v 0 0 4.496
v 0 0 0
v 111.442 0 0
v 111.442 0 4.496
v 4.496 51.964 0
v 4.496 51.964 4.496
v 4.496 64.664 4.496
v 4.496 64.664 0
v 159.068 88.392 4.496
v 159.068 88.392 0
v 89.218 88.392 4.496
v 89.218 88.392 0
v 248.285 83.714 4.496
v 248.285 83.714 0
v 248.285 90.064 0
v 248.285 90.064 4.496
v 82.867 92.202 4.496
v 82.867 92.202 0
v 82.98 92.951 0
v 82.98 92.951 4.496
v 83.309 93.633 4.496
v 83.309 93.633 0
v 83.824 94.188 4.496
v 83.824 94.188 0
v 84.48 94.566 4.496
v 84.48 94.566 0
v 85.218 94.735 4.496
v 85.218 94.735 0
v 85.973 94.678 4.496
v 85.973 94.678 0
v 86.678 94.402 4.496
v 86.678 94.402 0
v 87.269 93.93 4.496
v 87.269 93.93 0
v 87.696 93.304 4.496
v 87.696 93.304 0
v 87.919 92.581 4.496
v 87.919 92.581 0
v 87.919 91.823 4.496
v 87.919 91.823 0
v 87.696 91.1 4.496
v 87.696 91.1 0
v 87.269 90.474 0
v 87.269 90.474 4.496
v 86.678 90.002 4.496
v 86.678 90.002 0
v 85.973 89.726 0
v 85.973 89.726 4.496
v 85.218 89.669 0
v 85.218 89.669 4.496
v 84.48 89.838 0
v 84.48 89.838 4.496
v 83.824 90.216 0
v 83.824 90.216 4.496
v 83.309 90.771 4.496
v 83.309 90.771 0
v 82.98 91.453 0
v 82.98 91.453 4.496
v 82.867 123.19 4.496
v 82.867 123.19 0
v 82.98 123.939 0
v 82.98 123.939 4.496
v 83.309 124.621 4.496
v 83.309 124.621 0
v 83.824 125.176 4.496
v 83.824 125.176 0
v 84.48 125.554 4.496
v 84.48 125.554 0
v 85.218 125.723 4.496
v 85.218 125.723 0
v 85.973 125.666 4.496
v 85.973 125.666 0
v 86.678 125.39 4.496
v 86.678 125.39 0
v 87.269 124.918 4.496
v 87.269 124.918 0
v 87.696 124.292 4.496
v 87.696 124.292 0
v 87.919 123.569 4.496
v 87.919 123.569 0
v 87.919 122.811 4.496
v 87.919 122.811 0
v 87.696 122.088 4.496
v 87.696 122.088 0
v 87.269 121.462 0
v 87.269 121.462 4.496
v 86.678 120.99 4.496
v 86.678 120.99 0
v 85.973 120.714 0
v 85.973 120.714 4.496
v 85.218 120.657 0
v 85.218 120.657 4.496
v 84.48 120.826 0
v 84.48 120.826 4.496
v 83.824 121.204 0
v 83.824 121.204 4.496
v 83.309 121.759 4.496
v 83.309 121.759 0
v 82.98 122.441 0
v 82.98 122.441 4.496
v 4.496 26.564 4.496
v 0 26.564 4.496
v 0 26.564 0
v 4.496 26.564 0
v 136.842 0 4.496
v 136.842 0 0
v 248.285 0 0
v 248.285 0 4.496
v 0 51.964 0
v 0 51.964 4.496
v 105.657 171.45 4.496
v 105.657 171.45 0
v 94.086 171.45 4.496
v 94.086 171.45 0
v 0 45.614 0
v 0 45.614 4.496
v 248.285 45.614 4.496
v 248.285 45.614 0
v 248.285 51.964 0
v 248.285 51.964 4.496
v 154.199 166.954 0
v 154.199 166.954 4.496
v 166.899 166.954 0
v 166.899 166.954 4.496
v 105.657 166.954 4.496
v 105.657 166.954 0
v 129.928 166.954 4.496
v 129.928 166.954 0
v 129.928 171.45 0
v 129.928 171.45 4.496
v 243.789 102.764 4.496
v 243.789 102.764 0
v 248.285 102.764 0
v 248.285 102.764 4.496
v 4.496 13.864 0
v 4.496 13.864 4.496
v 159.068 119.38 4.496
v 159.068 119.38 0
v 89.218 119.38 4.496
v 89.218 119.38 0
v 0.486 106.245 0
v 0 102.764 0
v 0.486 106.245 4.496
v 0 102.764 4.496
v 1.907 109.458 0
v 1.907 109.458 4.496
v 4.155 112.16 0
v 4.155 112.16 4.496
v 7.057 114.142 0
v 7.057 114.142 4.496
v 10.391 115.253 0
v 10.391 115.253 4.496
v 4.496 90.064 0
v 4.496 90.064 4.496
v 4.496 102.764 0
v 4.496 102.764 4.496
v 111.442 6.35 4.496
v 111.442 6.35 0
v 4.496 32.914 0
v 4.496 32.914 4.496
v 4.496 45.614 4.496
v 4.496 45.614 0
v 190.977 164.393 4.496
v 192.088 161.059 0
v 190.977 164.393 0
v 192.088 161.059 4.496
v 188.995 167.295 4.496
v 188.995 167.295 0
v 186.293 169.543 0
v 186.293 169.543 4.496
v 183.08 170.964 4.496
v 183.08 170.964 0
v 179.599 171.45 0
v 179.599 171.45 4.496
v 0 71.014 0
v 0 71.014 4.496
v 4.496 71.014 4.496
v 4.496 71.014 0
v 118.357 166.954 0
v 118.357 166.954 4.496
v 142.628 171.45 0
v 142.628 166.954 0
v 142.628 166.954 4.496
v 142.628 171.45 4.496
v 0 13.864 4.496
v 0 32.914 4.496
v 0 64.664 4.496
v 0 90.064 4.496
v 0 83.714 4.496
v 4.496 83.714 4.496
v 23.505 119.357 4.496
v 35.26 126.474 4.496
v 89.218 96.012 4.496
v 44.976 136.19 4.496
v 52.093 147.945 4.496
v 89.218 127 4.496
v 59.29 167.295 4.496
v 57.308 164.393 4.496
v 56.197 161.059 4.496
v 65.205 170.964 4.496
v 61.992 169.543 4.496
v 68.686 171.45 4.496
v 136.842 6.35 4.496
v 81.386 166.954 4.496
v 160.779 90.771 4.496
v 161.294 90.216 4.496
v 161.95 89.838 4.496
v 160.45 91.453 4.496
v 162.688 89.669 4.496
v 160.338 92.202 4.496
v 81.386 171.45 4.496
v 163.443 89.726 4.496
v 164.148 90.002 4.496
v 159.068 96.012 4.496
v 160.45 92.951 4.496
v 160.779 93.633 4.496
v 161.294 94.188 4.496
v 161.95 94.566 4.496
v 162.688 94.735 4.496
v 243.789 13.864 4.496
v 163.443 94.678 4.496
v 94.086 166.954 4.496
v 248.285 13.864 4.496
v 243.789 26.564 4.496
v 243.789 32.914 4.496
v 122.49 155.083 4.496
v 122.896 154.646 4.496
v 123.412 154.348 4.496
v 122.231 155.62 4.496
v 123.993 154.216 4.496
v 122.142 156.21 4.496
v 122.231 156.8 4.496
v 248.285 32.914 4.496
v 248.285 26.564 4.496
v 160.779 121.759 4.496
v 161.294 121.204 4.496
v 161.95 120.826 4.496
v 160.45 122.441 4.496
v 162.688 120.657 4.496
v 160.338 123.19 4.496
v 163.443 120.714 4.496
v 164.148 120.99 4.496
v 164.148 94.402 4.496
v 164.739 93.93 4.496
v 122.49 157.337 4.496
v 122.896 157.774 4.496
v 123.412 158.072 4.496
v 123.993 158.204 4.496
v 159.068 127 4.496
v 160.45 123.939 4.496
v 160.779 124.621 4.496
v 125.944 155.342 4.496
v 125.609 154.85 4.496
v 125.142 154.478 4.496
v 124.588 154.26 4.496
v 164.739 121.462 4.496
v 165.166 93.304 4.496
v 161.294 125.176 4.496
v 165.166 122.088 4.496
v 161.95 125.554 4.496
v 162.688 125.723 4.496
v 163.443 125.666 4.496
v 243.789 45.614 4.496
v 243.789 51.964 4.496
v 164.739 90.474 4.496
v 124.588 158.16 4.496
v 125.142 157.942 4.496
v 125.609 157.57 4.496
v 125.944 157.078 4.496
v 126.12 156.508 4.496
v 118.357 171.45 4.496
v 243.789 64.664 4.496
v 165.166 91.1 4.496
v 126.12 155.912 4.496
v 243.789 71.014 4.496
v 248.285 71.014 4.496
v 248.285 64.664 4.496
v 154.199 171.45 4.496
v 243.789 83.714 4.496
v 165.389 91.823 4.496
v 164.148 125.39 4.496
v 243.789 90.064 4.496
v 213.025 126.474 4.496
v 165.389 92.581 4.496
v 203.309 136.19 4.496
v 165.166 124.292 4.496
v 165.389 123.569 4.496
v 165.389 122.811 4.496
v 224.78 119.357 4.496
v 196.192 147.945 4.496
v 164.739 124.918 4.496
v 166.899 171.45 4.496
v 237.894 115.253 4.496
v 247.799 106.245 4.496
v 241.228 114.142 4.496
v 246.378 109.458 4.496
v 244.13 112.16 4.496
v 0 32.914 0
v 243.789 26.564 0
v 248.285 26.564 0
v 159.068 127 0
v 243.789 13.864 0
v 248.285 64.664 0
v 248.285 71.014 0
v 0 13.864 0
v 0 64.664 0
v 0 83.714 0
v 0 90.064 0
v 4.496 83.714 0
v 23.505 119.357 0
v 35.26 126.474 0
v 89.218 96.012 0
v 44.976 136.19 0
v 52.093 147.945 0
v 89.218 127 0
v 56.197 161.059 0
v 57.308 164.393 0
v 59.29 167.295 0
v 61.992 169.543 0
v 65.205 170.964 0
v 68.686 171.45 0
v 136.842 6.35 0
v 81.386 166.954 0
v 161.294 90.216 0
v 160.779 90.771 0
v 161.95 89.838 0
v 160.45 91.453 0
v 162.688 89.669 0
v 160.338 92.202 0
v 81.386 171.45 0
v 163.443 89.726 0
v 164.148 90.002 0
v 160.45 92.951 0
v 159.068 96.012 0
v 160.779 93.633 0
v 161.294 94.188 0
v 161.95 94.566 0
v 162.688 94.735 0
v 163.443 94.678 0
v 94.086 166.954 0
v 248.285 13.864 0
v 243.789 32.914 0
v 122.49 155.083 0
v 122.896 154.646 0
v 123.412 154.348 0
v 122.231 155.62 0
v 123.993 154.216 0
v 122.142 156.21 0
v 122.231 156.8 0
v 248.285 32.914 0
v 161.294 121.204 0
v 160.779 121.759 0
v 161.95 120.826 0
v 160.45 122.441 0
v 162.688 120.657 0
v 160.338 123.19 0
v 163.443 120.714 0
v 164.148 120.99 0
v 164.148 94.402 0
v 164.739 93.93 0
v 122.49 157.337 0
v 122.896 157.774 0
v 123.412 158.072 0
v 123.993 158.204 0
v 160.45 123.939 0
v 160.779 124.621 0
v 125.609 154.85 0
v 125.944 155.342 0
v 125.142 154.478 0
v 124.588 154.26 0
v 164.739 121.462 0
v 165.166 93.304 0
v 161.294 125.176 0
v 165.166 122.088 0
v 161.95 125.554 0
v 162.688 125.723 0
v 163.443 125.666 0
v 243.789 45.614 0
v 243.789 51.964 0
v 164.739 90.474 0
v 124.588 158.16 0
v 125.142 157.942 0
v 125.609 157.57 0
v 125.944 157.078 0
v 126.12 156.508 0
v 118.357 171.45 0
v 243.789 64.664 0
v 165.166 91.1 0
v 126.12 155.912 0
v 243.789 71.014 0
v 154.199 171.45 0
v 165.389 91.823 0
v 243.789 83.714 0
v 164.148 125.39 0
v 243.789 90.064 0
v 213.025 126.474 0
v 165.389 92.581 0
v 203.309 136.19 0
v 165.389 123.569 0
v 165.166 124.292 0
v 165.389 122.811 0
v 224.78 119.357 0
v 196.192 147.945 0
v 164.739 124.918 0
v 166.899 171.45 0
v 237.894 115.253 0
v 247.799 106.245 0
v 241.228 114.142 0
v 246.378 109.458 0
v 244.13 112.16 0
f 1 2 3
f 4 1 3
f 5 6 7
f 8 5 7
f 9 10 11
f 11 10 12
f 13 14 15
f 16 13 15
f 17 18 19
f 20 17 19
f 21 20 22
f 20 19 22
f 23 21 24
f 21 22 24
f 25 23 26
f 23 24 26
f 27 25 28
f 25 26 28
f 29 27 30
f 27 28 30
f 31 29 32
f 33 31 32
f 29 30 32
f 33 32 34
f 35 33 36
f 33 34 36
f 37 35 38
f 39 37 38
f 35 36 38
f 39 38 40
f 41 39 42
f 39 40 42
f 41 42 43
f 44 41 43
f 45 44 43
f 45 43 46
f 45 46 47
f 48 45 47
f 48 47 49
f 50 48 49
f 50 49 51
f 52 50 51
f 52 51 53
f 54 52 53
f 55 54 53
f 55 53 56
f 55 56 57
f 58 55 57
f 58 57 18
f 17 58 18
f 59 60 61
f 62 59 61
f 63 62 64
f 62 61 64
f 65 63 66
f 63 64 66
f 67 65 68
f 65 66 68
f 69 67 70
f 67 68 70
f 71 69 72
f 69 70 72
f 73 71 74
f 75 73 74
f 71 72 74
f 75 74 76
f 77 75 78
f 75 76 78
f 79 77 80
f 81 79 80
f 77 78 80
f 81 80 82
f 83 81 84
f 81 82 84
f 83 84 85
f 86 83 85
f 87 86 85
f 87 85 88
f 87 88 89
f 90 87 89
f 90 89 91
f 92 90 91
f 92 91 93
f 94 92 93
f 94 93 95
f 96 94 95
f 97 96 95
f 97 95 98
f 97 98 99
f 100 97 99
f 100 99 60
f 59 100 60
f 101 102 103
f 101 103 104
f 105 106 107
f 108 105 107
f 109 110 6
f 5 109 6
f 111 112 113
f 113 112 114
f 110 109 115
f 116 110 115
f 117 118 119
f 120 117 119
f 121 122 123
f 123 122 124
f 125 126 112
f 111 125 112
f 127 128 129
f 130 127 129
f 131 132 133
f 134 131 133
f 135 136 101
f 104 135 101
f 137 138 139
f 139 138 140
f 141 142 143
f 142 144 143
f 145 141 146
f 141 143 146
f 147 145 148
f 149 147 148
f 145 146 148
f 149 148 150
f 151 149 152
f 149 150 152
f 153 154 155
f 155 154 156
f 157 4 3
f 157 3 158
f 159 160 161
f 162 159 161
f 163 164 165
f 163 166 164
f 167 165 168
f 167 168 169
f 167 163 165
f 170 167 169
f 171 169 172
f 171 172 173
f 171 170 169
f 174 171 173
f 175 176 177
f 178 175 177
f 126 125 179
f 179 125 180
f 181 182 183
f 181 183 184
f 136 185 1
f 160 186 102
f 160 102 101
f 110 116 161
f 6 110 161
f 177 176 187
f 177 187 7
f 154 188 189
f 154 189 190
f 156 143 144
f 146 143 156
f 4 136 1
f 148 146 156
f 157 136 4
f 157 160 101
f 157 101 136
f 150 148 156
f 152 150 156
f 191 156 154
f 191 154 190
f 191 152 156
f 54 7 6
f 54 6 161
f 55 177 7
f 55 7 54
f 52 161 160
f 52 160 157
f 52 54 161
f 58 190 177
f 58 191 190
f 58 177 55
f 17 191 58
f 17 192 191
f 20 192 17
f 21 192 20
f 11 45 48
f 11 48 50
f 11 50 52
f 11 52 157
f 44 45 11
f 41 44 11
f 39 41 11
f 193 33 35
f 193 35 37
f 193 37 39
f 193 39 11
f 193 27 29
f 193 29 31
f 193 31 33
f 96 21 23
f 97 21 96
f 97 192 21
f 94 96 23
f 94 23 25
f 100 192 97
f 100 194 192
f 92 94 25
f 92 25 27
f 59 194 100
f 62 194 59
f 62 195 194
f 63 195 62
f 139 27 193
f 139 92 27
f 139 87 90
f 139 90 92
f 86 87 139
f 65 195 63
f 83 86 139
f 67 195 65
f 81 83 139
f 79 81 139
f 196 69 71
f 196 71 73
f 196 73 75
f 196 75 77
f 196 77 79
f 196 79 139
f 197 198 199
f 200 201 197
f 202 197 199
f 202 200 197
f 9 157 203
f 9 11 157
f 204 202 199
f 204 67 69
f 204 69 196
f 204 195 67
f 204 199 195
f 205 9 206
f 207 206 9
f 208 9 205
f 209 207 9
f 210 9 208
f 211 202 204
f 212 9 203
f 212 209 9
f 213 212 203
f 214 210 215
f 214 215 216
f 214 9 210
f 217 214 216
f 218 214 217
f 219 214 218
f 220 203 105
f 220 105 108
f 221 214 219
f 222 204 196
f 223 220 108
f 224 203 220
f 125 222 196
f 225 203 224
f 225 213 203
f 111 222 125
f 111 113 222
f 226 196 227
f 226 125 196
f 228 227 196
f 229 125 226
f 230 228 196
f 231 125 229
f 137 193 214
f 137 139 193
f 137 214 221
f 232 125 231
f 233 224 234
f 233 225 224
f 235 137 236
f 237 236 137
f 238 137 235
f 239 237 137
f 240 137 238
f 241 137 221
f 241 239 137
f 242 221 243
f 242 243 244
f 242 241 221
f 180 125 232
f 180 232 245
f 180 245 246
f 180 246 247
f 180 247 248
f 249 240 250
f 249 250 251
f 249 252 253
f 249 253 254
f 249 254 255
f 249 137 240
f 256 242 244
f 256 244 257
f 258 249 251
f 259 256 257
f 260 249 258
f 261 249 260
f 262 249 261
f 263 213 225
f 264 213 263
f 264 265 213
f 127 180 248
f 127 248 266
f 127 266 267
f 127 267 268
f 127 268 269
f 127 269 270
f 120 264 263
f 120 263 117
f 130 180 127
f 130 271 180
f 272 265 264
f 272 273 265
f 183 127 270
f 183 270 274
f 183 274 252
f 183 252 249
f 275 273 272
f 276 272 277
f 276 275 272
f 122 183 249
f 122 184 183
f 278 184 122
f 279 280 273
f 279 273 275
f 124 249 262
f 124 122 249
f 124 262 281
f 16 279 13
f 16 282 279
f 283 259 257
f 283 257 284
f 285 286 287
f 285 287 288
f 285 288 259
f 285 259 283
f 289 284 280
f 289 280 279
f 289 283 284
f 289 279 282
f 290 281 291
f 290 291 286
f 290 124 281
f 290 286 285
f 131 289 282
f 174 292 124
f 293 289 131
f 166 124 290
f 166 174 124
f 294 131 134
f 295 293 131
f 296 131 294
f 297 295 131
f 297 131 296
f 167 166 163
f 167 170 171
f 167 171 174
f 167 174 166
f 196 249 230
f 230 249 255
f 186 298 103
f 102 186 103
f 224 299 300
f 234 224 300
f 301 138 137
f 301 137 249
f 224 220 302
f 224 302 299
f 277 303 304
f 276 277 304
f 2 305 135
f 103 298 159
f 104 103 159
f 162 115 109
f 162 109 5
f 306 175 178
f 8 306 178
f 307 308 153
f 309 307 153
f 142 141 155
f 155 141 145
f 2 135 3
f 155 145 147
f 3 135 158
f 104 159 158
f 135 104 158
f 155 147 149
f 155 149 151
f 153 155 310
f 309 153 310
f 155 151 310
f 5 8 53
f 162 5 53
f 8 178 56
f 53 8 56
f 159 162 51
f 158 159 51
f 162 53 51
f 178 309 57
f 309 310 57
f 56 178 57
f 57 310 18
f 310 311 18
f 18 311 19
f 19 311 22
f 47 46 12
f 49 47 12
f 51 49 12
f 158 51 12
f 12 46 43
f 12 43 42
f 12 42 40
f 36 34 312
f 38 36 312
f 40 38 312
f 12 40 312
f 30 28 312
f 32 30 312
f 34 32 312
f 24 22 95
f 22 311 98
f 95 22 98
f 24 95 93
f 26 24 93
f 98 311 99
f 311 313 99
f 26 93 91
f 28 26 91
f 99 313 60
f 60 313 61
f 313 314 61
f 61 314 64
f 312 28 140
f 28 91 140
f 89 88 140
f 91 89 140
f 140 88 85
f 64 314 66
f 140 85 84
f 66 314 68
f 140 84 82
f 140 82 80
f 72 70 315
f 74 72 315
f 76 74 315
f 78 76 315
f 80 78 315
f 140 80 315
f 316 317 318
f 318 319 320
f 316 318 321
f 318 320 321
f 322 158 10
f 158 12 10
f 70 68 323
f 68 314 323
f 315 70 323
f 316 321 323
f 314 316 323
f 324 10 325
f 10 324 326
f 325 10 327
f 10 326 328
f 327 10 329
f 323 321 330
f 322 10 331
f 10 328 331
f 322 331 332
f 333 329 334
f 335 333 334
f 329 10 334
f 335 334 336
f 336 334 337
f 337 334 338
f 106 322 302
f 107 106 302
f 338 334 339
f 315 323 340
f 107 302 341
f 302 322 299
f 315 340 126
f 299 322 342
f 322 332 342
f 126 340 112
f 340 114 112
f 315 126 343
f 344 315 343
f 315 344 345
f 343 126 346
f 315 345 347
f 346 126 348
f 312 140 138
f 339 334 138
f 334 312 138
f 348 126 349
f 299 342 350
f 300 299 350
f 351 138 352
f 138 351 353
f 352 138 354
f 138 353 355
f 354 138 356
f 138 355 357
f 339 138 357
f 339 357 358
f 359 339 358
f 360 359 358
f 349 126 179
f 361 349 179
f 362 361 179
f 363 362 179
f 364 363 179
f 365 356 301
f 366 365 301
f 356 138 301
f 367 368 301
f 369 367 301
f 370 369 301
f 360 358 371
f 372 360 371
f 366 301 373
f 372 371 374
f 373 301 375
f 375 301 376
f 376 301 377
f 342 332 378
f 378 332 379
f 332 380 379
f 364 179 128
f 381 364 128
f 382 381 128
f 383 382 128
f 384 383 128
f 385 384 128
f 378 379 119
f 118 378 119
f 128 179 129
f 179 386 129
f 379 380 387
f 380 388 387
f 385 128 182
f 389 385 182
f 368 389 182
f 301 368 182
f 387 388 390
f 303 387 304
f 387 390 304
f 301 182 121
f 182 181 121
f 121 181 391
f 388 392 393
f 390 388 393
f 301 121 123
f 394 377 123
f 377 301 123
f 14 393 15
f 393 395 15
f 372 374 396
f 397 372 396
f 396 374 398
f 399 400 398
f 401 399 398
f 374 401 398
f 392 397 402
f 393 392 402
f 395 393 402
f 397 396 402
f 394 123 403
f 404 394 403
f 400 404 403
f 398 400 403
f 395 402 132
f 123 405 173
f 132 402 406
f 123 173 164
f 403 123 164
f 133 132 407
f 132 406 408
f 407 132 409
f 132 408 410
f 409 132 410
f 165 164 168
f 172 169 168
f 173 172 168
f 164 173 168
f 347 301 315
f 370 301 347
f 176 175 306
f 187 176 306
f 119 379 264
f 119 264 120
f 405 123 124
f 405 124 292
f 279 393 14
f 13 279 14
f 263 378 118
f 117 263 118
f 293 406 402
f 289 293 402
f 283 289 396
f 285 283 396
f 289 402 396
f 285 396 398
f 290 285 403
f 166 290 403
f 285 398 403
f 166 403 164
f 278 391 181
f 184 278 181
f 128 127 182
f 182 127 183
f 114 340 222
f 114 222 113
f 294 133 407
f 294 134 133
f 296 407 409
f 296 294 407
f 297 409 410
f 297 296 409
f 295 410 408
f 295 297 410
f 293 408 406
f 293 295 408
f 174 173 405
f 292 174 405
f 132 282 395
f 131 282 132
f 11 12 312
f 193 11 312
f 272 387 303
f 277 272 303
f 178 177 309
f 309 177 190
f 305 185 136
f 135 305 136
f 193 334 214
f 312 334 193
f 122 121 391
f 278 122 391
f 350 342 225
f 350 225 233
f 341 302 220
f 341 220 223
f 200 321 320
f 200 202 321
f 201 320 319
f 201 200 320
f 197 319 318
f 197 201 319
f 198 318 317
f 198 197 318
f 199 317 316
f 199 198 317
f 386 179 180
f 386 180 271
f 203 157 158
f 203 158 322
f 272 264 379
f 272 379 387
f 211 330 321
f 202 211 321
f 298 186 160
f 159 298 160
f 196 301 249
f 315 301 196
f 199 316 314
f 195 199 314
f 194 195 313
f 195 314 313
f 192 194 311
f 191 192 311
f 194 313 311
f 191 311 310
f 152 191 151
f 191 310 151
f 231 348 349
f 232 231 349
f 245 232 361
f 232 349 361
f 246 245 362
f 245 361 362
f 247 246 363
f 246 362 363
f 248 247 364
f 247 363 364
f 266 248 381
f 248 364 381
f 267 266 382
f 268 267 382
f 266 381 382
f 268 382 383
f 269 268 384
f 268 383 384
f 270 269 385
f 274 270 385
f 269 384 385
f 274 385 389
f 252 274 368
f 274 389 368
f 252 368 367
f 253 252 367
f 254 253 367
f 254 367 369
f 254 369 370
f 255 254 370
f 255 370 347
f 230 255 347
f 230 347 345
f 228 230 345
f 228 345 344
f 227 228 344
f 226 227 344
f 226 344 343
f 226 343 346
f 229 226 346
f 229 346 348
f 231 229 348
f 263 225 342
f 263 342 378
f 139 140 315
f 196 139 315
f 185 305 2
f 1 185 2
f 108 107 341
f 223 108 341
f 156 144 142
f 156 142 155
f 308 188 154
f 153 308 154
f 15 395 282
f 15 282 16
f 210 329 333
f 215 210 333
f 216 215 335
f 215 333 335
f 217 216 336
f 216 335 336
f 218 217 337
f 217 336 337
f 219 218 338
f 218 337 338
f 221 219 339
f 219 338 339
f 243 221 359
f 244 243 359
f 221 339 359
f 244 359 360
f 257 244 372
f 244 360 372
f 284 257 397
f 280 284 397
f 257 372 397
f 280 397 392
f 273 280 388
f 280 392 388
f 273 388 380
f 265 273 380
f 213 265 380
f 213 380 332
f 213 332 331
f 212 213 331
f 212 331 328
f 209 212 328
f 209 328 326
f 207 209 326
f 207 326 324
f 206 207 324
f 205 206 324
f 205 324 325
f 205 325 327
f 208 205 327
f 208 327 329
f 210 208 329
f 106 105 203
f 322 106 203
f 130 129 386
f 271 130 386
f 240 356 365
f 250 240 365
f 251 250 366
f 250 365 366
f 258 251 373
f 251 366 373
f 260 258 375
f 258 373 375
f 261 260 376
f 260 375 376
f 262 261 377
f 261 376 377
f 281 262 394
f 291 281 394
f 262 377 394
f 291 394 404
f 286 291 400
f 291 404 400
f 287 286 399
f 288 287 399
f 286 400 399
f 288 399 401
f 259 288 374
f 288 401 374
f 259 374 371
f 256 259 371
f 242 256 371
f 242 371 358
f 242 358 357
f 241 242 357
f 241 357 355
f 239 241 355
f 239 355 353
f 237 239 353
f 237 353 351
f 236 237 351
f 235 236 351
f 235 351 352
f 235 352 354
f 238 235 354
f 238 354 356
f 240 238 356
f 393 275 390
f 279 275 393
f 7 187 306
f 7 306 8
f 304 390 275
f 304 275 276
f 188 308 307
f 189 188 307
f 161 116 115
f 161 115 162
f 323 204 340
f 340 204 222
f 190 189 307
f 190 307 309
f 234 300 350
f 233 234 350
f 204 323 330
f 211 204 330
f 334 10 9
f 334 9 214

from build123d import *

# Parameters (mm, degrees)
BOSS_EXTRUDE1_DEPTH = 4.4958
FILLET1_R           = 12.7
SKETCH2_W           = 4.4958
SKETCH2_H           = 12.7
CUT_EXTRUDE1_DEPTH  = 302.762747772
SKETCH3_W           = 12.7
SKETCH3_H           = 4.4958
CUT_EXTRUDE2_DEPTH  = 302.762747772
SKETCH5_W           = 25.4
SKETCH5_H           = 6.35
CUT_EXTRUDE4_DEPTH  = 302.762747772
SKETCH7_R           = 2.54
SKETCH7_W           = 69.85
SKETCH7_H           = 7.62
CUT_EXTRUDE6_DEPTH  = 302.762747772
SKETCH8_R           = 2
CUT_EXTRUDE7_DEPTH  = 302.762747772


with BuildPart() as part:
    # Sketch1 → Boss-Extrude1 (new body)
    with BuildSketch(Plane.XY):
        with BuildLine():
            Line((0, 114.3), (0, 0))
            Line((0, 0), (248.285, 0))
            Line((248.285, 0), (248.285, 114.3))
            ThreePointArc((248.285, 114.3), (207.873847455, 131.038847455), (191.135, 171.45))
            Line((191.135, 171.45), (57.15, 171.45))
            ThreePointArc((57.15, 171.45), (40.411152545, 131.038847455), (0, 114.3))
        make_face()
    extrude(amount=BOSS_EXTRUDE1_DEPTH)

    # Fillet1
    fillet1_edges = [part.edges().sort_by_distance(p)[0] for p in [
        (248.285, 114.3, 2.2479),
        (0, 114.3, 2.2479),
        (57.15, 171.45, 2.2479),
        (191.135, 171.45, 2.2479),
    ]]
    fillet(fillet1_edges, radius=FILLET1_R)

    # Sketch2 → Cut-Extrude1 (cut, through all)
    with BuildSketch(Plane.XY.offset(4.4958)):
        with Locations((246.0371, 96.414248202)):
            Rectangle(SKETCH2_W, SKETCH2_H)
        with Locations((246.0371, 77.364248202)):
            Rectangle(SKETCH2_W, SKETCH2_H)
        with Locations((246.0371, 39.264248202)):
            Rectangle(SKETCH2_W, SKETCH2_H)
        with Locations((246.0371, 58.314248202)):
            Rectangle(SKETCH2_W, SKETCH2_H)
        with Locations((246.0371, 20.214248202)):
            Rectangle(SKETCH2_W, SKETCH2_H)
        with Locations((2.2479, 96.414248202)):
            Rectangle(SKETCH2_W, SKETCH2_H)
        with Locations((2.2479, 77.364248202)):
            Rectangle(SKETCH2_W, SKETCH2_H)
        with Locations((2.2479, 58.314248202)):
            Rectangle(SKETCH2_W, SKETCH2_H)
        with Locations((2.2479, 39.264248202)):
            Rectangle(SKETCH2_W, SKETCH2_H)
        with Locations((2.2479, 20.214248202)):
            Rectangle(SKETCH2_W, SKETCH2_H)
    extrude(amount=-CUT_EXTRUDE1_DEPTH, mode=Mode.SUBTRACT)

    # Sketch3 → Cut-Extrude2 (cut, through all)
    with BuildSketch(Plane.XY.offset(4.4958)):
        with Locations((112.006917266, 169.2021)):
            Rectangle(SKETCH3_W, SKETCH3_H)
        with Locations((87.735751798, 169.2021)):
            Rectangle(SKETCH3_W, SKETCH3_H)
        with Locations((136.278082734, 169.2021)):
            Rectangle(SKETCH3_W, SKETCH3_H)
        with Locations((160.549248202, 169.2021)):
            Rectangle(SKETCH3_W, SKETCH3_H)
    extrude(amount=-CUT_EXTRUDE2_DEPTH, mode=Mode.SUBTRACT)

    # Sketch5 → Cut-Extrude4 (cut, through all)
    with BuildSketch(Plane.XY.offset(4.4958)):
        with Locations((124.1425, 3.175)):
            Rectangle(SKETCH5_W, SKETCH5_H)
    extrude(amount=-CUT_EXTRUDE4_DEPTH, mode=Mode.SUBTRACT)

    # Sketch7 → Cut-Extrude6 (cut, through all)
    with BuildSketch(Plane(origin=(0, 0, 0), x_dir=(-1, 0, 0), z_dir=(0, 0, -1))):
        with Locations((-85.4075, 123.19)):
            Circle(SKETCH7_R)
        with Locations((-162.8775, 123.19)):
            Circle(SKETCH7_R)
        with Locations((-124.1425, 123.19)):
            Rectangle(SKETCH7_W, SKETCH7_H)
        with Locations((-124.1425, 92.202)):
            Rectangle(SKETCH7_W, SKETCH7_H)
        with Locations((-85.4075, 92.202)):
            Circle(SKETCH7_R)
        with Locations((-162.8775, 92.202)):
            Circle(SKETCH7_R)
    extrude(amount=-CUT_EXTRUDE6_DEPTH, mode=Mode.SUBTRACT)

    # Sketch8 → Cut-Extrude7 (cut, through all)
    with BuildSketch(Plane(origin=(0, 0, 0), x_dir=(-1, 0, 0), z_dir=(0, 0, -1))):
        with Locations((-124.1425, 156.21)):
            Circle(SKETCH8_R)
    extrude(amount=-CUT_EXTRUDE7_DEPTH, mode=Mode.SUBTRACT)


solid = part.part
